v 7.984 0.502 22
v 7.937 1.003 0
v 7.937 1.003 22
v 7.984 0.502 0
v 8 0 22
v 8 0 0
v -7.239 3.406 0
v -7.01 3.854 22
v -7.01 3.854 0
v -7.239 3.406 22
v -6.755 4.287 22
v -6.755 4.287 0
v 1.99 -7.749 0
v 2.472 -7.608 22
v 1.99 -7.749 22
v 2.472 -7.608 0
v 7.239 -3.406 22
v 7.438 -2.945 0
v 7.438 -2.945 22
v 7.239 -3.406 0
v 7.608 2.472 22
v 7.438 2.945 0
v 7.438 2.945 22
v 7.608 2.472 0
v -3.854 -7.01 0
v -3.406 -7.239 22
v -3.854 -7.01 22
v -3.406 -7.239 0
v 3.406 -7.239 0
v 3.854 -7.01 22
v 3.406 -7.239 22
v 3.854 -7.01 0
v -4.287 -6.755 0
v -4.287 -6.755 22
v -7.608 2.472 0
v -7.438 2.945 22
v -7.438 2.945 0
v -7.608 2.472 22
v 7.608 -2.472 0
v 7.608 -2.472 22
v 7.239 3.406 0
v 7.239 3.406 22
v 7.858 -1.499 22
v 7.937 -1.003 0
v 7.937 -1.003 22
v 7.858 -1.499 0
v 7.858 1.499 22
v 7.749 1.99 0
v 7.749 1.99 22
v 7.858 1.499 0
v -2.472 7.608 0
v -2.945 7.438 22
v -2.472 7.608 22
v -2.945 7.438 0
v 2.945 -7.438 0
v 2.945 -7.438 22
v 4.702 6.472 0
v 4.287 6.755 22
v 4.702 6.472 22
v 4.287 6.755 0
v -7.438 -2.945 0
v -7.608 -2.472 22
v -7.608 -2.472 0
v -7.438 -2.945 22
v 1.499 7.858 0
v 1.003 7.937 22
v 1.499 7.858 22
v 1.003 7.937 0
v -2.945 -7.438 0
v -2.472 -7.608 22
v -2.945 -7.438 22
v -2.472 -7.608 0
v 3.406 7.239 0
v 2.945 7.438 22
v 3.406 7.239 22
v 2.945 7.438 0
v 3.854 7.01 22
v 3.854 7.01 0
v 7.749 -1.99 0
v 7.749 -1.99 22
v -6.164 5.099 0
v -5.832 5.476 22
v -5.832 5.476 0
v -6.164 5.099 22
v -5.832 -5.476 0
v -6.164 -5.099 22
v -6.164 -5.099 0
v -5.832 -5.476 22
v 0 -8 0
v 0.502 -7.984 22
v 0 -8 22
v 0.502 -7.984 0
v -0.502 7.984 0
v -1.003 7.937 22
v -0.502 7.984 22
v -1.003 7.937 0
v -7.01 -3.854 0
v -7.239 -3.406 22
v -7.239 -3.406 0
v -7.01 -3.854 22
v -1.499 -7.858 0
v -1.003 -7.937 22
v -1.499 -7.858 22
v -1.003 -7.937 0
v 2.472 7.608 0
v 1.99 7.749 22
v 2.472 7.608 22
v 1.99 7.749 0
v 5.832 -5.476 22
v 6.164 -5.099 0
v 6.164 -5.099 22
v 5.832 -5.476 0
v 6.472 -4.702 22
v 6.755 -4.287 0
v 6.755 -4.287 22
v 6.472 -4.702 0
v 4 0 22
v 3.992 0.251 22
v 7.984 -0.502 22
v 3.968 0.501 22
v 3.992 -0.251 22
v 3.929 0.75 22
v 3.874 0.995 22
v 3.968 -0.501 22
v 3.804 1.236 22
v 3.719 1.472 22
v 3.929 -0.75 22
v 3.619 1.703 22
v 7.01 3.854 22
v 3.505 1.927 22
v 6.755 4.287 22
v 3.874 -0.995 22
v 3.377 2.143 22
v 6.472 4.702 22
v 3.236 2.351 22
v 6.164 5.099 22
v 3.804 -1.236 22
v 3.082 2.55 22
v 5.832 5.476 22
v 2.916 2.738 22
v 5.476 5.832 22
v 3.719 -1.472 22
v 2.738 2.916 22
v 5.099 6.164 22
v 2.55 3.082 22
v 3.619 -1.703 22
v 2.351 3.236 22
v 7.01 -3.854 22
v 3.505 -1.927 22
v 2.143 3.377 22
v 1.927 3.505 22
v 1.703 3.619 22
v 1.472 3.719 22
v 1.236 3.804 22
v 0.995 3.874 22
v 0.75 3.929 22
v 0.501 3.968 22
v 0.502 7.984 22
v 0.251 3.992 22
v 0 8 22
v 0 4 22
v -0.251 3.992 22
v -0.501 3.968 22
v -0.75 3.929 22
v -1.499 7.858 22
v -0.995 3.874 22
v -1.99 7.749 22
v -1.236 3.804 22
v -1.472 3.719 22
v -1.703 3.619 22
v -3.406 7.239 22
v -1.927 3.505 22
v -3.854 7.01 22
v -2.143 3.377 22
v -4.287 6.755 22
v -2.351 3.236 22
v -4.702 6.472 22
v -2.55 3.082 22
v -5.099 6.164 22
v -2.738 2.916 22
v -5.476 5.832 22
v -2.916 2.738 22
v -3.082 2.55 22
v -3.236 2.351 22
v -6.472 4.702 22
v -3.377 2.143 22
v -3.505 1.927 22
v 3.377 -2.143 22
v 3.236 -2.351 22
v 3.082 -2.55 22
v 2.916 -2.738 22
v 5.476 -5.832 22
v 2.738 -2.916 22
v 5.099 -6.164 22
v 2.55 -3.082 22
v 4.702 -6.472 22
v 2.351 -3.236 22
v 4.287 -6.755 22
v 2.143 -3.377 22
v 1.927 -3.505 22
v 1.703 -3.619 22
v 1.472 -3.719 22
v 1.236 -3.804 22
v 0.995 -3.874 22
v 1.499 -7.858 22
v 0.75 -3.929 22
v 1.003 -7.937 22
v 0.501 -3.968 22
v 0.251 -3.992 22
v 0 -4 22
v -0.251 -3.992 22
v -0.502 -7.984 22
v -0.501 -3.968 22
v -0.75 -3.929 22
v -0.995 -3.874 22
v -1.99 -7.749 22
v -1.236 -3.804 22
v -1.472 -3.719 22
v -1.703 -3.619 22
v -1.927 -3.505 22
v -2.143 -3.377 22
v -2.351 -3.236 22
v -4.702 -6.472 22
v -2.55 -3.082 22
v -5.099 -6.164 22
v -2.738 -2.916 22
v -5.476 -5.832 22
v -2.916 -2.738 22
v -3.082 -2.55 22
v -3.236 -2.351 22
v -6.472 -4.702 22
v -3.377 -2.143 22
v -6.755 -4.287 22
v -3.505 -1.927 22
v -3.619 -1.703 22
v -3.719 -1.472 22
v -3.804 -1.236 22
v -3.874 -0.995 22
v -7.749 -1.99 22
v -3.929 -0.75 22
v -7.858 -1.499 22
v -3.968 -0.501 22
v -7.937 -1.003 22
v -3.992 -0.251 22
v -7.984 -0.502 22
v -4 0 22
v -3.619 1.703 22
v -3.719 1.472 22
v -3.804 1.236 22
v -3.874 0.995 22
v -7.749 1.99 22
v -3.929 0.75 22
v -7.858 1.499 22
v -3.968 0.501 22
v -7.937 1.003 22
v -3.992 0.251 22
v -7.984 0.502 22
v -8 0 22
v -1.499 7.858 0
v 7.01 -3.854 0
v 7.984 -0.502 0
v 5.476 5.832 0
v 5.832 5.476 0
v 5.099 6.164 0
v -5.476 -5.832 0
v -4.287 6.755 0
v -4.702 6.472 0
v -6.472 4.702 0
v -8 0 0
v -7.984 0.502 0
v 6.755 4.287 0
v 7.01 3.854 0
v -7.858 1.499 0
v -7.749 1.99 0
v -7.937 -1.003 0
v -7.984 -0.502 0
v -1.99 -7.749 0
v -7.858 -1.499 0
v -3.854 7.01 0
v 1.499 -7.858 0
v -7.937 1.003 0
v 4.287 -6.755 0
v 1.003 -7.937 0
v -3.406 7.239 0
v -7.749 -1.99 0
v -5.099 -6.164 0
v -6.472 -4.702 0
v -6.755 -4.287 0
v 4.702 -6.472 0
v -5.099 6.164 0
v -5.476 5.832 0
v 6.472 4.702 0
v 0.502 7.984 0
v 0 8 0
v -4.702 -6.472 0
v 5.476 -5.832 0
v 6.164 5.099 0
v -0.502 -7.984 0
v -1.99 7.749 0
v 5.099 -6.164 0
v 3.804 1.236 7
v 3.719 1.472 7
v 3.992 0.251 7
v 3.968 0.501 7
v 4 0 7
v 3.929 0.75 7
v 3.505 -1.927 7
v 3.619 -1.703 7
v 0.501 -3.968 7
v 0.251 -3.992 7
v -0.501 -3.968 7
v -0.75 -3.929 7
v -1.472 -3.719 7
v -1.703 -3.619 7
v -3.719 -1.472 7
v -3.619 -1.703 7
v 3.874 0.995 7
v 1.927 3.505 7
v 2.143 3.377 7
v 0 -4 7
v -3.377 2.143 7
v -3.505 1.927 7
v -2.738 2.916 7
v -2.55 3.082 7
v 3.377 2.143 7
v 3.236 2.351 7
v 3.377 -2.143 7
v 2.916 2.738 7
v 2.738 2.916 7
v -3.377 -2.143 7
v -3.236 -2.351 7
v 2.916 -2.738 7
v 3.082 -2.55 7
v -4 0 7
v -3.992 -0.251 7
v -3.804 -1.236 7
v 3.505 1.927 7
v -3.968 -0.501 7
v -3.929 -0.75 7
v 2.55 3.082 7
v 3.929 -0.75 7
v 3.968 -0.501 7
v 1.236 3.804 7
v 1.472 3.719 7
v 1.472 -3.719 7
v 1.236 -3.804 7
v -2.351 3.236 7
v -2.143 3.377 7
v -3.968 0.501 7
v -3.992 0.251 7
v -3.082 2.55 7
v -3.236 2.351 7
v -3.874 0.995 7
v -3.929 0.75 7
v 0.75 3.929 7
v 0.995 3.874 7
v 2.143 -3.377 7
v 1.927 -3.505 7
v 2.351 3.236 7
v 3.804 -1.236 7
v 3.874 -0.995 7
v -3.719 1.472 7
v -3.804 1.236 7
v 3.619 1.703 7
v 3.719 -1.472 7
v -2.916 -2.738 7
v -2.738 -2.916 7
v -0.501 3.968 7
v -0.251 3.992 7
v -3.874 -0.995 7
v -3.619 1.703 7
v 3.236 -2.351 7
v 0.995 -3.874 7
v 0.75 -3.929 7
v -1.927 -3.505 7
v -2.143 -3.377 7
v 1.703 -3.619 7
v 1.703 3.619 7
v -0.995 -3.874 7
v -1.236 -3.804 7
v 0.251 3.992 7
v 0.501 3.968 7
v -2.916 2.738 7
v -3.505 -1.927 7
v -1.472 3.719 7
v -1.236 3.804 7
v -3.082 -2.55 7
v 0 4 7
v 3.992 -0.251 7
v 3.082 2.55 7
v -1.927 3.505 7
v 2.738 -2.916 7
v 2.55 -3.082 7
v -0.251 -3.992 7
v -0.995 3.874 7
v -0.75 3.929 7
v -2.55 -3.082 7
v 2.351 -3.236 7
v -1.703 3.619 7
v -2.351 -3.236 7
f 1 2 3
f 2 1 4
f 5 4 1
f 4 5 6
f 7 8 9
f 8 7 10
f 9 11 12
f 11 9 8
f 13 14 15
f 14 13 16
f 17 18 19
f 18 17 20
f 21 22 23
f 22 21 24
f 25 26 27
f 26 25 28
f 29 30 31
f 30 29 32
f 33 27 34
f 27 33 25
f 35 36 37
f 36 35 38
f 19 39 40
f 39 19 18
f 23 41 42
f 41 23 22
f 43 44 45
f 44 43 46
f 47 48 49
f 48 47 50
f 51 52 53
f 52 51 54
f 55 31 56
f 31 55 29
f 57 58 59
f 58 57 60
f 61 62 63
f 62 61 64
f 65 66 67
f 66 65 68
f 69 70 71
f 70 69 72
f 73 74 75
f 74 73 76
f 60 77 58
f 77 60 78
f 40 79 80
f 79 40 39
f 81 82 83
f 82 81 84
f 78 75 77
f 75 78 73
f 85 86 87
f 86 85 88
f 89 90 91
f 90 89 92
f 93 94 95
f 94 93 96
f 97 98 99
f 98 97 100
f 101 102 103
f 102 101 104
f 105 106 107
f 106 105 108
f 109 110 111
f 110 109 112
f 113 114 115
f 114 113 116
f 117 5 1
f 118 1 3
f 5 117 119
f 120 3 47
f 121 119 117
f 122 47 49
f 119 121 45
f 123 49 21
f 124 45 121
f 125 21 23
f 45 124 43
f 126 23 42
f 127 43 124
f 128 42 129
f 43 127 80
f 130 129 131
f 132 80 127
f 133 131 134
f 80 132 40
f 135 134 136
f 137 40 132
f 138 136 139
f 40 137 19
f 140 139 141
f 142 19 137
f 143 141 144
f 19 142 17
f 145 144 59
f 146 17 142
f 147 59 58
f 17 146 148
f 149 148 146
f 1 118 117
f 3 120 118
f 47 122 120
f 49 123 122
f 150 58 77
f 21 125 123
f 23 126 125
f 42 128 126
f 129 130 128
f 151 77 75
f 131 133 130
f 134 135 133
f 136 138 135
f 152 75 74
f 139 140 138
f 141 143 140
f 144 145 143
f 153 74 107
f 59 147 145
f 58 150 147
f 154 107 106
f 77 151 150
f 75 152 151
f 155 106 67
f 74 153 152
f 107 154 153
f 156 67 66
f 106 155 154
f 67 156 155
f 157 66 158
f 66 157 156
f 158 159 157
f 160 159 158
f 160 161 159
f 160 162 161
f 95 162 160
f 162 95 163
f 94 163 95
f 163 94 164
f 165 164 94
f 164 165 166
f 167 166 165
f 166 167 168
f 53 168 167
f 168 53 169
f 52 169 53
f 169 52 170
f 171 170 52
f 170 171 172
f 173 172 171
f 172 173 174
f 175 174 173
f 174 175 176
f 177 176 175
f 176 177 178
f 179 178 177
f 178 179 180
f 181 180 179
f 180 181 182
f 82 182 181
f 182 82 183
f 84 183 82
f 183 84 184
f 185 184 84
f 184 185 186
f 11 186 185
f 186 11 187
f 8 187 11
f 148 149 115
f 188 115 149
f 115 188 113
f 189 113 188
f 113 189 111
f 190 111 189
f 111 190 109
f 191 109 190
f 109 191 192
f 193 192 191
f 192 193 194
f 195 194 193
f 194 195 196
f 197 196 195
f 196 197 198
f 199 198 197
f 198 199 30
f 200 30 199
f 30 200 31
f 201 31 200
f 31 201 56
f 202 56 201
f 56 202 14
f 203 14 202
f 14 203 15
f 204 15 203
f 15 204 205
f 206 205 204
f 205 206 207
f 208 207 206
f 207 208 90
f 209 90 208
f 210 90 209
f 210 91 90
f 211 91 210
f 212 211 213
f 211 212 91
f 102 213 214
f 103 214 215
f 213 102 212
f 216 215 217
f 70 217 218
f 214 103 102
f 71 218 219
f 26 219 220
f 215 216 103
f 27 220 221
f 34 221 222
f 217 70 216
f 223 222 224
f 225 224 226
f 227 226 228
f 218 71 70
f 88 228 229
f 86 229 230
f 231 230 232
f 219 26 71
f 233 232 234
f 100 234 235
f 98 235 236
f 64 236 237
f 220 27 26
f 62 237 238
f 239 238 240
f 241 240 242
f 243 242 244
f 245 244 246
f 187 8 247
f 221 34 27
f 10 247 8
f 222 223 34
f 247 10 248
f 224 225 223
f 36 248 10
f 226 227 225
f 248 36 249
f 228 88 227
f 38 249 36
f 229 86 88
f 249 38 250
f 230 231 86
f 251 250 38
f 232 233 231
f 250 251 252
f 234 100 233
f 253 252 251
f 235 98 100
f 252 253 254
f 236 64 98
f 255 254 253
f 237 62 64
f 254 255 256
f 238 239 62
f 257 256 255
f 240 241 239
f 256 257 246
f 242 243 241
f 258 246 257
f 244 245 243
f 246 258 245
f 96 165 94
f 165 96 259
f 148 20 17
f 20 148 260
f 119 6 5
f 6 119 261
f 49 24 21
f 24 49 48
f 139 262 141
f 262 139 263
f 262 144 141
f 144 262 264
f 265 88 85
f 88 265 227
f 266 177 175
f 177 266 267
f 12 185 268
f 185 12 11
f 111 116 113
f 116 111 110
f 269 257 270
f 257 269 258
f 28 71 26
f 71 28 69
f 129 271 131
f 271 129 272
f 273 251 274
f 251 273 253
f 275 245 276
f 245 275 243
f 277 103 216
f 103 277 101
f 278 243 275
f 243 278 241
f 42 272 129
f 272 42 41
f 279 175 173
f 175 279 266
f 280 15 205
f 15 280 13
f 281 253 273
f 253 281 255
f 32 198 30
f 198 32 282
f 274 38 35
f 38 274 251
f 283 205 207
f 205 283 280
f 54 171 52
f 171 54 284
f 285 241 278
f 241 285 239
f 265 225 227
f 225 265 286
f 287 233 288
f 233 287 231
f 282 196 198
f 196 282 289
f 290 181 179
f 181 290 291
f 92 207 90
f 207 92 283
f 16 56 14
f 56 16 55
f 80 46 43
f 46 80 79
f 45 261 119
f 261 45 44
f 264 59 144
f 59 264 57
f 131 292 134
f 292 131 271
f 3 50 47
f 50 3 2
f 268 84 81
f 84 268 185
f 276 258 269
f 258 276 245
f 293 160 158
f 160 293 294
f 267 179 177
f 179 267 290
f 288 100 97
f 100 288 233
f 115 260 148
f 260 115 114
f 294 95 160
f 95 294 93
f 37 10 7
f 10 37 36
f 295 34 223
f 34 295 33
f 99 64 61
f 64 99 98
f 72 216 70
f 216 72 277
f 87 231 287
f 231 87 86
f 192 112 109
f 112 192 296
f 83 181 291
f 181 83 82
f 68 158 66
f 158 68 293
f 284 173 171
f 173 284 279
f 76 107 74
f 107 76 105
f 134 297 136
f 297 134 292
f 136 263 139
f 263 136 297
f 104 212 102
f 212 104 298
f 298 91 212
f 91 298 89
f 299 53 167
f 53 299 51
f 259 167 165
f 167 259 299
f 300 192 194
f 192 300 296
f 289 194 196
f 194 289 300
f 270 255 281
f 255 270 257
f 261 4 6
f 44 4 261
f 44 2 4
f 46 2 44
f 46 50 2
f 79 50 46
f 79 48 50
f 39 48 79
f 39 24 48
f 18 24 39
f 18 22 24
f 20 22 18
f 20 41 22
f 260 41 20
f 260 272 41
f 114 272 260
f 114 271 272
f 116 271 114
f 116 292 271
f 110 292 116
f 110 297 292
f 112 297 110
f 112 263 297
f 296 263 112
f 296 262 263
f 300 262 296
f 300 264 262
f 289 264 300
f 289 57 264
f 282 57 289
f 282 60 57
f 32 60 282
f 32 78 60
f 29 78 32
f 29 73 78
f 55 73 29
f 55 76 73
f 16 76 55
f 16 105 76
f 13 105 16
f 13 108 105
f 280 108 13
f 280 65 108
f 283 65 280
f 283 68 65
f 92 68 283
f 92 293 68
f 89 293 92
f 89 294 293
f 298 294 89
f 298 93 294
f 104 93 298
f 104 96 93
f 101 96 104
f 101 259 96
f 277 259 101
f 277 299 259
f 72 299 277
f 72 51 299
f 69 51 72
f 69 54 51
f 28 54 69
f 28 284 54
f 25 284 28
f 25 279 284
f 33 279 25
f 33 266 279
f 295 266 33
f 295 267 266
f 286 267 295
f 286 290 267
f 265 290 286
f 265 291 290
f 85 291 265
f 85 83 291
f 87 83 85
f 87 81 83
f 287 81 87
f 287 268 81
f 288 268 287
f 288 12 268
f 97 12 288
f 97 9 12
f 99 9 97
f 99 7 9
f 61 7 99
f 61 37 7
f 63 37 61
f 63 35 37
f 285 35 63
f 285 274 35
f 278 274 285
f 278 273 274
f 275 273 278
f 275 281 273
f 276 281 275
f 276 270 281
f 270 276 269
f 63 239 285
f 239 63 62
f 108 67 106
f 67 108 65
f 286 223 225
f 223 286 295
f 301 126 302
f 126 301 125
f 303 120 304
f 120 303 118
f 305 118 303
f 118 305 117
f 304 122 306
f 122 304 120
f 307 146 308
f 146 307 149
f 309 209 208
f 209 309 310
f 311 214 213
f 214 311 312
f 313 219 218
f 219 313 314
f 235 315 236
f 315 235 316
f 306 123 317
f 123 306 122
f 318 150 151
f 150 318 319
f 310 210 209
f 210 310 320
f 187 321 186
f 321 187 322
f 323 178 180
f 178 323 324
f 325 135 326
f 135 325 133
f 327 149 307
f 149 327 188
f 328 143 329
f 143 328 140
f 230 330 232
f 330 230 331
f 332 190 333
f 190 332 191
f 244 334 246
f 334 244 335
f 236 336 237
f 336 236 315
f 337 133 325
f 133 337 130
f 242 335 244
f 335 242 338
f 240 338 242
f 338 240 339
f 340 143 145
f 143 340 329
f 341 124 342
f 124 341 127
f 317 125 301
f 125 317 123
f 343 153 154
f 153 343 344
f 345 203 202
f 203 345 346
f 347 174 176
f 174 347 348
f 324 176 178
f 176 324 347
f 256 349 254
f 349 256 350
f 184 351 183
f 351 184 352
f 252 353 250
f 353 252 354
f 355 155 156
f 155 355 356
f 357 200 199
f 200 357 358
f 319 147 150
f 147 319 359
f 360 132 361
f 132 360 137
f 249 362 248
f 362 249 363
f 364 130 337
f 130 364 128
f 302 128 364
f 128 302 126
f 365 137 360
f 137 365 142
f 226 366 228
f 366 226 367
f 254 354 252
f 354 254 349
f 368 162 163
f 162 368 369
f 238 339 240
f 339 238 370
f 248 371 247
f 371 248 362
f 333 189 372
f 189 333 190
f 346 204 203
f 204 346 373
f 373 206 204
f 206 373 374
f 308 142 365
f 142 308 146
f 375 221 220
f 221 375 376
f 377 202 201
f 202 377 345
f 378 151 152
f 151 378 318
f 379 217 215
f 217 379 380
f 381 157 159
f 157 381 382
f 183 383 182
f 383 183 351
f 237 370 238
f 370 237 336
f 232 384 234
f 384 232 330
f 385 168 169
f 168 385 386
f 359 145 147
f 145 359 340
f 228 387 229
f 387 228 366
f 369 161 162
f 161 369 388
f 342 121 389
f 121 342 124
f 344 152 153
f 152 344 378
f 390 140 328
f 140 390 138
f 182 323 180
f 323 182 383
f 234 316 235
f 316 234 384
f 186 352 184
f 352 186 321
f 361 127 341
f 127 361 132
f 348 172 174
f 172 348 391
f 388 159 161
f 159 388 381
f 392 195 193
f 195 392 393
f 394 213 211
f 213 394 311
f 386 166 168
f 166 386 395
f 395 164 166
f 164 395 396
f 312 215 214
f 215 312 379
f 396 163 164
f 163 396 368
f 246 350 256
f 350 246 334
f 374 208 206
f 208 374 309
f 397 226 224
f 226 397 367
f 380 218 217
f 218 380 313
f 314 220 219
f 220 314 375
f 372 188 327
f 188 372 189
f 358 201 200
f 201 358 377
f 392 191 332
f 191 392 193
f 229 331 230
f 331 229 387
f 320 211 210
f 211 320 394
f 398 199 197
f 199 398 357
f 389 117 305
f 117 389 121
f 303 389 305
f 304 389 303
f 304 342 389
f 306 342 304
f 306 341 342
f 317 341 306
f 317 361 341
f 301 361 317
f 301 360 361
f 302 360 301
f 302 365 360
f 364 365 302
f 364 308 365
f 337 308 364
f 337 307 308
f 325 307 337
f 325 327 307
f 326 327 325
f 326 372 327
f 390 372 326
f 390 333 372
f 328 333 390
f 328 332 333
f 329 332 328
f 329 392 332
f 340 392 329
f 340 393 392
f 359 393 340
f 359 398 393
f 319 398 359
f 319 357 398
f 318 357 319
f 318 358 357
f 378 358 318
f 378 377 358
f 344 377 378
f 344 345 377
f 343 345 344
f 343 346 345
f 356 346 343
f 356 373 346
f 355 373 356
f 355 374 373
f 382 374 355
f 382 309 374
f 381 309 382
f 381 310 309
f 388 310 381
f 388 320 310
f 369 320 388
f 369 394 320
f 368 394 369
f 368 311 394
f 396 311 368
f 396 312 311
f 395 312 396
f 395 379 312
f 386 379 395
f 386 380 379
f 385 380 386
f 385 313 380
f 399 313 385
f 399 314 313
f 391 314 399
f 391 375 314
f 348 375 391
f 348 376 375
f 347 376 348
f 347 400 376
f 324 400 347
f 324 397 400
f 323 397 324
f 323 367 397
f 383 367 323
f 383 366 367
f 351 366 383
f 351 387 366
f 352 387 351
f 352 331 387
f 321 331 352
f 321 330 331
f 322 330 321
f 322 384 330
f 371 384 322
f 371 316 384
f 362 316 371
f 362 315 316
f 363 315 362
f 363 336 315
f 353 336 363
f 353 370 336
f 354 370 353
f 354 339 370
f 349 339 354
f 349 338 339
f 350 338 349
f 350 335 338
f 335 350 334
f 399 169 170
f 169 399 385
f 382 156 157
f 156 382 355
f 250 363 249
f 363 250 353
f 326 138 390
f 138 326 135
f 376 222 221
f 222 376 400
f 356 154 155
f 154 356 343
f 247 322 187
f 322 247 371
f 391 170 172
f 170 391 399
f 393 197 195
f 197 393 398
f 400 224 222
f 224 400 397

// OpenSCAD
difference() {
  cylinder(h=22, d=16, $fn=100);
  translate([0, 0, 7]) cylinder(h=16, d=8, $fn=100);
}
